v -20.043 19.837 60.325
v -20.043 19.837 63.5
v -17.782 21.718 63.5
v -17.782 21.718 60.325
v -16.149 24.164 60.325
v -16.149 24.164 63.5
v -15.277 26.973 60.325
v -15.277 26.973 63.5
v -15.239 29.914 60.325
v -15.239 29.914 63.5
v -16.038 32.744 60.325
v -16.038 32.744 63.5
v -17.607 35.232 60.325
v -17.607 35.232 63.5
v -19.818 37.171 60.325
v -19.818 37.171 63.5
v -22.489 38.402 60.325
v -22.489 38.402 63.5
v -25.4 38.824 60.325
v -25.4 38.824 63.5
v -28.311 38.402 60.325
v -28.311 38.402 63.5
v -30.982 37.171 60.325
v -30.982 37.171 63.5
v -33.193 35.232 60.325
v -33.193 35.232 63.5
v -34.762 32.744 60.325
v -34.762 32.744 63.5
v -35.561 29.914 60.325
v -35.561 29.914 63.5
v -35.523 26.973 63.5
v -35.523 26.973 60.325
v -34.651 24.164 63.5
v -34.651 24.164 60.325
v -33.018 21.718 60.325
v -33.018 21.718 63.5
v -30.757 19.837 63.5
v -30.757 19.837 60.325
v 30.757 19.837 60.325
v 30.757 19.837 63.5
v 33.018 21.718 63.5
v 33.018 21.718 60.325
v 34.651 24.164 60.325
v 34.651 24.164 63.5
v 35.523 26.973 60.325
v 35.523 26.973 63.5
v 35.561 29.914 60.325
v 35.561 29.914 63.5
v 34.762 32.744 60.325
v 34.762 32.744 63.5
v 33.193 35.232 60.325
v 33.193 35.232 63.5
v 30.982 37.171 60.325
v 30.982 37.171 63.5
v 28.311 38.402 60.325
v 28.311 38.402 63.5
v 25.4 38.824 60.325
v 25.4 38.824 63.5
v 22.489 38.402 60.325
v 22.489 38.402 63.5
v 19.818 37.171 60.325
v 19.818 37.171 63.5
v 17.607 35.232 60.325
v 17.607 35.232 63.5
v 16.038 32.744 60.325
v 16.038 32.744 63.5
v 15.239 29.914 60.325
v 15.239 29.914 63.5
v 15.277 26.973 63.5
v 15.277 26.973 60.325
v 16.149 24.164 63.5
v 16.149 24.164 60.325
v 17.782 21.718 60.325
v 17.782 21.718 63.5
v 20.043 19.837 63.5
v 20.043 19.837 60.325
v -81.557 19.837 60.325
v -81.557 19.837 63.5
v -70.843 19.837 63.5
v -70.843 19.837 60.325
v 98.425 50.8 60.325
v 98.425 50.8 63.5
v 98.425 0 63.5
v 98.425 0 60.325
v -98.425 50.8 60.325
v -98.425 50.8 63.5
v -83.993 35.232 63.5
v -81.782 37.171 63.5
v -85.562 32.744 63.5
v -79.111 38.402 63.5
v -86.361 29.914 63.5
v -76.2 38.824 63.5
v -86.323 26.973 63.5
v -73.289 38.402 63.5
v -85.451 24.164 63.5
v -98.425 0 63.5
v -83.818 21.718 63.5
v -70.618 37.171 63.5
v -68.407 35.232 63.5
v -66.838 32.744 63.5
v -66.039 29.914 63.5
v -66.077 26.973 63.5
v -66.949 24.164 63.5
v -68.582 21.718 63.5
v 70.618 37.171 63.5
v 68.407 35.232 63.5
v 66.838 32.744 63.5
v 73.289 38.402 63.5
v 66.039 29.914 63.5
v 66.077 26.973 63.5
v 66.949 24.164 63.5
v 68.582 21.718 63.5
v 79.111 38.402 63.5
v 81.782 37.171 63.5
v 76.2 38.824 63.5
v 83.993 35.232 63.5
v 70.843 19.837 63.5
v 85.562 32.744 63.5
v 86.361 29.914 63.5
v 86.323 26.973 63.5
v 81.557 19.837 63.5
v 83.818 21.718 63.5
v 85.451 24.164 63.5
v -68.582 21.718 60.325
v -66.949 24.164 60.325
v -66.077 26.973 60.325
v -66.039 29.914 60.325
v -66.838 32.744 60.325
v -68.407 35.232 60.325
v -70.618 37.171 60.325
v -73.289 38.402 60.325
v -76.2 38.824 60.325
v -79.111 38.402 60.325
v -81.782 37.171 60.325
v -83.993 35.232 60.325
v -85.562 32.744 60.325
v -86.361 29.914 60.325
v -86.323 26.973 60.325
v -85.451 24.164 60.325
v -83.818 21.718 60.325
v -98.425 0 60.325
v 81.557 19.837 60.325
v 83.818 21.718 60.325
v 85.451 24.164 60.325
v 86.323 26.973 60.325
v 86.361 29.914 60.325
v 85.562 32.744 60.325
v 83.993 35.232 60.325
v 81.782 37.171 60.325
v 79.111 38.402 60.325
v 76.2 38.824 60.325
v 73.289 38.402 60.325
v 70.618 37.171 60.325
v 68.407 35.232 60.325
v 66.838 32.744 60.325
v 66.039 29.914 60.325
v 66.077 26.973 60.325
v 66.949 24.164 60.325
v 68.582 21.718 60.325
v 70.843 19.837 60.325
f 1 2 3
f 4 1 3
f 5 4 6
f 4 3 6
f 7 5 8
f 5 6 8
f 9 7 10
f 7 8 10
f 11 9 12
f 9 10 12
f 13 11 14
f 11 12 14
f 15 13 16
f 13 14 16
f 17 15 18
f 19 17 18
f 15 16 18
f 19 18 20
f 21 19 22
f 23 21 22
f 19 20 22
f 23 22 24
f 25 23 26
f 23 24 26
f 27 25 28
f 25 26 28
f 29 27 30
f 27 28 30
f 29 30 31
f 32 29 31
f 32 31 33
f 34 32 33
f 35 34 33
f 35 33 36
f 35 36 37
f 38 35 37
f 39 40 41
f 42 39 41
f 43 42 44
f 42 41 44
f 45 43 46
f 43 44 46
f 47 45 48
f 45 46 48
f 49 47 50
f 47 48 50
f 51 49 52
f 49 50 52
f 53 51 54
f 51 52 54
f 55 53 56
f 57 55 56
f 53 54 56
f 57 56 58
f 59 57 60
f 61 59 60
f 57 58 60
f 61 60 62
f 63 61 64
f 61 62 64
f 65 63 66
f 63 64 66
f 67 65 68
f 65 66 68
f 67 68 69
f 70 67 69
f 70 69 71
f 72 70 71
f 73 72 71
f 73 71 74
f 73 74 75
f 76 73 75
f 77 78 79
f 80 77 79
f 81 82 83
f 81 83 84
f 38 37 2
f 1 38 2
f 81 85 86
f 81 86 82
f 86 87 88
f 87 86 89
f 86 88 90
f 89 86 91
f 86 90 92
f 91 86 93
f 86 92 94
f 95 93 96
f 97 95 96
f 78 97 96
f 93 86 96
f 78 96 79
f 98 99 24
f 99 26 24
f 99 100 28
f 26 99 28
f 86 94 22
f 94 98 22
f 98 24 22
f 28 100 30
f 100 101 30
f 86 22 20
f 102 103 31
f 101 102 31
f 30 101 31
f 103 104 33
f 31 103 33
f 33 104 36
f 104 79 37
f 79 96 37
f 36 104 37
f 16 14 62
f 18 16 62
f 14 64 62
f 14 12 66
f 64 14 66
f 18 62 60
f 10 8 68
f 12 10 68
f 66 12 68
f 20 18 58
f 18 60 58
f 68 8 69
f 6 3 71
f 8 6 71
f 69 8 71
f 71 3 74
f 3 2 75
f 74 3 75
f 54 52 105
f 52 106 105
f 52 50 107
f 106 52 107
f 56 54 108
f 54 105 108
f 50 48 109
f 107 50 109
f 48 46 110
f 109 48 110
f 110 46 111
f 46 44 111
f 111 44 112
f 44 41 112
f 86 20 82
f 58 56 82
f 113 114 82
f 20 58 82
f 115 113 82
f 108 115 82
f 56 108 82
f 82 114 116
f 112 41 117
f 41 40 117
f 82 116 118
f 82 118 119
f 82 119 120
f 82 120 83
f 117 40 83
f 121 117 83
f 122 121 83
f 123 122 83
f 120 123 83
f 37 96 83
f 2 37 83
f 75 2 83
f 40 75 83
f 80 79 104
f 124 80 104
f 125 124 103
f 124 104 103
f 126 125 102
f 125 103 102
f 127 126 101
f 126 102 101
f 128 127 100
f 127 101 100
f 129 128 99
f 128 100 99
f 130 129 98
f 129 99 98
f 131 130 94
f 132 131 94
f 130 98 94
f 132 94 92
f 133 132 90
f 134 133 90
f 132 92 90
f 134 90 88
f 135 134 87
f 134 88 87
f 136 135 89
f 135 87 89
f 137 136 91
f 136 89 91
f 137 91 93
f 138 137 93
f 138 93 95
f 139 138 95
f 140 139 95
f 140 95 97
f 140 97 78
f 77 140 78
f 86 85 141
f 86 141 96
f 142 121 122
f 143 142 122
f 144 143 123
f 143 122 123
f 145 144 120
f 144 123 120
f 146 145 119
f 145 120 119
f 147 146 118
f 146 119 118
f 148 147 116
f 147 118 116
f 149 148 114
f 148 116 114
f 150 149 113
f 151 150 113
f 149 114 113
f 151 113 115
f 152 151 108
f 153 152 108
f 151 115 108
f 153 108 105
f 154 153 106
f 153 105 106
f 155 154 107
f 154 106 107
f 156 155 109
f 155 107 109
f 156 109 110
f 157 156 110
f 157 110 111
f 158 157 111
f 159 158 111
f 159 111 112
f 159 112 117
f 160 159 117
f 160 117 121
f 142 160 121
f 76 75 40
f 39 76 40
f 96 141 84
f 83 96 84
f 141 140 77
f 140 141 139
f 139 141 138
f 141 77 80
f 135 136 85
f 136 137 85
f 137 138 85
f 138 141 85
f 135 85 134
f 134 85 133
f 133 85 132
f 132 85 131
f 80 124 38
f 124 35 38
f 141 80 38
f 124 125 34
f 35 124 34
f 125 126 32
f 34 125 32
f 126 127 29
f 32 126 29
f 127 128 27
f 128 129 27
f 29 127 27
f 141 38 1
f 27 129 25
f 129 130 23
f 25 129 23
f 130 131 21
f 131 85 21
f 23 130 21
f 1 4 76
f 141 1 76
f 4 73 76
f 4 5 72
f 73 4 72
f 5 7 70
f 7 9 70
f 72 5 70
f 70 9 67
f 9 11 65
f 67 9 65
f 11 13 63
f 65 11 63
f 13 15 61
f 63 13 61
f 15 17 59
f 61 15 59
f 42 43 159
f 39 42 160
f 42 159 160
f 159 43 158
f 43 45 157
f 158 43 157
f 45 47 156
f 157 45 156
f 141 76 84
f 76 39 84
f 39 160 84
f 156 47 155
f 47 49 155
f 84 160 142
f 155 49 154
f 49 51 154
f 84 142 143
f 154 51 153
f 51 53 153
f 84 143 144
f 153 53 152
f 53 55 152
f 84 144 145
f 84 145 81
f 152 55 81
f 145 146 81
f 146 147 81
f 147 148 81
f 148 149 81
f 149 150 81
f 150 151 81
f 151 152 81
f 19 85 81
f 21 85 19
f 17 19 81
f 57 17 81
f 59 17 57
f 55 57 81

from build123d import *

# Parameters (mm, degrees)
SKETCH1_W           = 203.2
SKETCH1_H           = 127
BOSS_EXTRUDE1_DEPTH = 50.8
SKETCH2_W           = 196.85
SKETCH2_H           = 120.65
CUT_EXTRUDE1_DEPTH  = 51.8
SKETCH4_W           = 203.2
SKETCH4_H           = 127
SKETCH4_W_2         = 196.85
SKETCH4_H_2         = 120.65
BOSS_EXTRUDE2_DEPTH = 6.35
CUT_EXTRUDE5_DEPTH  = 128
CUT_EXTRUDE6_REACH  = 205.2
CUT_EXTRUDE7_REACH  = 205.2
SKETCH13_R          = 12.55395
CUT_EXTRUDE8_DEPTH  = 51.8


with BuildPart() as part:
    # Sketch1 → Boss-Extrude1 (new body)
    with BuildSketch(Plane(origin=(0, 0, 0), x_dir=(1, 0, 0), z_dir=(0, 1, 0))):
        Rectangle(SKETCH1_W, SKETCH1_H)
    extrude(amount=BOSS_EXTRUDE1_DEPTH)

    # Sketch2 → Cut-Extrude1 (cut, through all)
    with BuildSketch(Plane(origin=(0, 50.8, 0), x_dir=(1, 0, 0), z_dir=(0, 1, 0))):
        Rectangle(SKETCH2_W, SKETCH2_H)
    extrude(amount=-CUT_EXTRUDE1_DEPTH, mode=Mode.SUBTRACT)

    # Sketch4 → Boss-Extrude2 (add)
    with BuildSketch(Plane(origin=(0, 50.8, 0), x_dir=(1, 0, 0), z_dir=(0, 1, 0))):
        Rectangle(SKETCH4_W, SKETCH4_H)
        Rectangle(SKETCH4_W_2, SKETCH4_H_2, mode=Mode.SUBTRACT)
    extrude(amount=-BOSS_EXTRUDE2_DEPTH)

    # Sketch10 → Cut-Extrude5 (cut, through all)
    with BuildSketch(Plane.XY.offset(63.5)):
        with BuildLine():
            ThreePointArc((-70.843294161, 19.8374), (-76.2, 38.8239), (-81.556705839, 19.8374))
            Line((-81.556705839, 19.8374), (-70.843294161, 19.8374))
        make_face()
        with BuildLine():
            ThreePointArc((81.556705839, 19.8374), (76.2, 38.8239), (70.843294161, 19.8374))
            Line((70.843294161, 19.8374), (81.556705839, 19.8374))
        make_face()
        with BuildLine():
            ThreePointArc((30.756705839, 19.8374), (25.4, 38.8239), (20.043294161, 19.8374))
            Line((20.043294161, 19.8374), (30.756705839, 19.8374))
        make_face()
        with BuildLine():
            ThreePointArc((-20.043294161, 19.8374), (-25.4, 38.8239), (-30.756705839, 19.8374))
            Line((-30.756705839, 19.8374), (-20.043294161, 19.8374))
        make_face()
    extrude(amount=-CUT_EXTRUDE5_DEPTH, mode=Mode.SUBTRACT)

    # Sketch12 → Cut-Extrude6 (cut, up to next)
    with BuildSketch(Plane(origin=(101.6, 0, 0), x_dir=(0, 0, -1), z_dir=(1, 0, 0)), mode=Mode.PRIVATE) as cut_extrude6_sk1:
        with BuildLine():
            ThreePointArc((-20.043294161, 19.8374), (-25.4, 38.8239), (-30.756705839, 19.8374))
            Line((-30.756705839, 19.8374), (-20.043294161, 19.8374))
        make_face()
    cut_extrude6_tool1 = extrude(cut_extrude6_sk1.sketch, amount=-CUT_EXTRUDE6_REACH, mode=Mode.PRIVATE) & part.part
    add(cut_extrude6_tool1.solids().sort_by_distance((101.6, 28.896198, 25.4))[0], mode=Mode.SUBTRACT)
    # Sketch12 → Cut-Extrude6 (cut, up to next)
    with BuildSketch(Plane(origin=(101.6, 0, 0), x_dir=(0, 0, -1), z_dir=(1, 0, 0)), mode=Mode.PRIVATE) as cut_extrude6_sk2:
        with BuildLine():
            ThreePointArc((30.756705839, 19.8374), (25.4, 38.8239), (20.043294161, 19.8374))
            Line((20.043294161, 19.8374), (30.756705839, 19.8374))
        make_face()
    cut_extrude6_tool2 = extrude(cut_extrude6_sk2.sketch, amount=-CUT_EXTRUDE6_REACH, mode=Mode.PRIVATE) & part.part
    add(cut_extrude6_tool2.solids().sort_by_distance((101.6, 28.896198, -25.4))[0], mode=Mode.SUBTRACT)

    # Sketch13 → Cut-Extrude7 (cut, up to next)
    with BuildSketch(Plane.ZY.offset(101.6), mode=Mode.PRIVATE) as cut_extrude7_sk1:
        with Locations((12.7, 28.575)):
            Circle(SKETCH13_R)
    cut_extrude7_tool1 = extrude(cut_extrude7_sk1.sketch, amount=-CUT_EXTRUDE7_REACH, mode=Mode.PRIVATE) & part.part
    add(cut_extrude7_tool1.solids().sort_by_distance((-101.6, 28.575, 12.7))[0], mode=Mode.SUBTRACT)

    # Sketch14 → Cut-Extrude8 (cut, through all)
    with BuildSketch(Plane(origin=(0, 50.8, 0), x_dir=(1, 0, 0), z_dir=(0, 1, 0))):
        Polygon((-98.425, -60.325), (-98.425, -63.5), (-101.6, -63.5), (-101.6, 63.5), (101.6, 63.5), (101.6, -63.5), (98.425, -63.5), (98.425, -60.325), align=None)
    extrude(amount=-CUT_EXTRUDE8_DEPTH, mode=Mode.SUBTRACT)


solid = part.part
